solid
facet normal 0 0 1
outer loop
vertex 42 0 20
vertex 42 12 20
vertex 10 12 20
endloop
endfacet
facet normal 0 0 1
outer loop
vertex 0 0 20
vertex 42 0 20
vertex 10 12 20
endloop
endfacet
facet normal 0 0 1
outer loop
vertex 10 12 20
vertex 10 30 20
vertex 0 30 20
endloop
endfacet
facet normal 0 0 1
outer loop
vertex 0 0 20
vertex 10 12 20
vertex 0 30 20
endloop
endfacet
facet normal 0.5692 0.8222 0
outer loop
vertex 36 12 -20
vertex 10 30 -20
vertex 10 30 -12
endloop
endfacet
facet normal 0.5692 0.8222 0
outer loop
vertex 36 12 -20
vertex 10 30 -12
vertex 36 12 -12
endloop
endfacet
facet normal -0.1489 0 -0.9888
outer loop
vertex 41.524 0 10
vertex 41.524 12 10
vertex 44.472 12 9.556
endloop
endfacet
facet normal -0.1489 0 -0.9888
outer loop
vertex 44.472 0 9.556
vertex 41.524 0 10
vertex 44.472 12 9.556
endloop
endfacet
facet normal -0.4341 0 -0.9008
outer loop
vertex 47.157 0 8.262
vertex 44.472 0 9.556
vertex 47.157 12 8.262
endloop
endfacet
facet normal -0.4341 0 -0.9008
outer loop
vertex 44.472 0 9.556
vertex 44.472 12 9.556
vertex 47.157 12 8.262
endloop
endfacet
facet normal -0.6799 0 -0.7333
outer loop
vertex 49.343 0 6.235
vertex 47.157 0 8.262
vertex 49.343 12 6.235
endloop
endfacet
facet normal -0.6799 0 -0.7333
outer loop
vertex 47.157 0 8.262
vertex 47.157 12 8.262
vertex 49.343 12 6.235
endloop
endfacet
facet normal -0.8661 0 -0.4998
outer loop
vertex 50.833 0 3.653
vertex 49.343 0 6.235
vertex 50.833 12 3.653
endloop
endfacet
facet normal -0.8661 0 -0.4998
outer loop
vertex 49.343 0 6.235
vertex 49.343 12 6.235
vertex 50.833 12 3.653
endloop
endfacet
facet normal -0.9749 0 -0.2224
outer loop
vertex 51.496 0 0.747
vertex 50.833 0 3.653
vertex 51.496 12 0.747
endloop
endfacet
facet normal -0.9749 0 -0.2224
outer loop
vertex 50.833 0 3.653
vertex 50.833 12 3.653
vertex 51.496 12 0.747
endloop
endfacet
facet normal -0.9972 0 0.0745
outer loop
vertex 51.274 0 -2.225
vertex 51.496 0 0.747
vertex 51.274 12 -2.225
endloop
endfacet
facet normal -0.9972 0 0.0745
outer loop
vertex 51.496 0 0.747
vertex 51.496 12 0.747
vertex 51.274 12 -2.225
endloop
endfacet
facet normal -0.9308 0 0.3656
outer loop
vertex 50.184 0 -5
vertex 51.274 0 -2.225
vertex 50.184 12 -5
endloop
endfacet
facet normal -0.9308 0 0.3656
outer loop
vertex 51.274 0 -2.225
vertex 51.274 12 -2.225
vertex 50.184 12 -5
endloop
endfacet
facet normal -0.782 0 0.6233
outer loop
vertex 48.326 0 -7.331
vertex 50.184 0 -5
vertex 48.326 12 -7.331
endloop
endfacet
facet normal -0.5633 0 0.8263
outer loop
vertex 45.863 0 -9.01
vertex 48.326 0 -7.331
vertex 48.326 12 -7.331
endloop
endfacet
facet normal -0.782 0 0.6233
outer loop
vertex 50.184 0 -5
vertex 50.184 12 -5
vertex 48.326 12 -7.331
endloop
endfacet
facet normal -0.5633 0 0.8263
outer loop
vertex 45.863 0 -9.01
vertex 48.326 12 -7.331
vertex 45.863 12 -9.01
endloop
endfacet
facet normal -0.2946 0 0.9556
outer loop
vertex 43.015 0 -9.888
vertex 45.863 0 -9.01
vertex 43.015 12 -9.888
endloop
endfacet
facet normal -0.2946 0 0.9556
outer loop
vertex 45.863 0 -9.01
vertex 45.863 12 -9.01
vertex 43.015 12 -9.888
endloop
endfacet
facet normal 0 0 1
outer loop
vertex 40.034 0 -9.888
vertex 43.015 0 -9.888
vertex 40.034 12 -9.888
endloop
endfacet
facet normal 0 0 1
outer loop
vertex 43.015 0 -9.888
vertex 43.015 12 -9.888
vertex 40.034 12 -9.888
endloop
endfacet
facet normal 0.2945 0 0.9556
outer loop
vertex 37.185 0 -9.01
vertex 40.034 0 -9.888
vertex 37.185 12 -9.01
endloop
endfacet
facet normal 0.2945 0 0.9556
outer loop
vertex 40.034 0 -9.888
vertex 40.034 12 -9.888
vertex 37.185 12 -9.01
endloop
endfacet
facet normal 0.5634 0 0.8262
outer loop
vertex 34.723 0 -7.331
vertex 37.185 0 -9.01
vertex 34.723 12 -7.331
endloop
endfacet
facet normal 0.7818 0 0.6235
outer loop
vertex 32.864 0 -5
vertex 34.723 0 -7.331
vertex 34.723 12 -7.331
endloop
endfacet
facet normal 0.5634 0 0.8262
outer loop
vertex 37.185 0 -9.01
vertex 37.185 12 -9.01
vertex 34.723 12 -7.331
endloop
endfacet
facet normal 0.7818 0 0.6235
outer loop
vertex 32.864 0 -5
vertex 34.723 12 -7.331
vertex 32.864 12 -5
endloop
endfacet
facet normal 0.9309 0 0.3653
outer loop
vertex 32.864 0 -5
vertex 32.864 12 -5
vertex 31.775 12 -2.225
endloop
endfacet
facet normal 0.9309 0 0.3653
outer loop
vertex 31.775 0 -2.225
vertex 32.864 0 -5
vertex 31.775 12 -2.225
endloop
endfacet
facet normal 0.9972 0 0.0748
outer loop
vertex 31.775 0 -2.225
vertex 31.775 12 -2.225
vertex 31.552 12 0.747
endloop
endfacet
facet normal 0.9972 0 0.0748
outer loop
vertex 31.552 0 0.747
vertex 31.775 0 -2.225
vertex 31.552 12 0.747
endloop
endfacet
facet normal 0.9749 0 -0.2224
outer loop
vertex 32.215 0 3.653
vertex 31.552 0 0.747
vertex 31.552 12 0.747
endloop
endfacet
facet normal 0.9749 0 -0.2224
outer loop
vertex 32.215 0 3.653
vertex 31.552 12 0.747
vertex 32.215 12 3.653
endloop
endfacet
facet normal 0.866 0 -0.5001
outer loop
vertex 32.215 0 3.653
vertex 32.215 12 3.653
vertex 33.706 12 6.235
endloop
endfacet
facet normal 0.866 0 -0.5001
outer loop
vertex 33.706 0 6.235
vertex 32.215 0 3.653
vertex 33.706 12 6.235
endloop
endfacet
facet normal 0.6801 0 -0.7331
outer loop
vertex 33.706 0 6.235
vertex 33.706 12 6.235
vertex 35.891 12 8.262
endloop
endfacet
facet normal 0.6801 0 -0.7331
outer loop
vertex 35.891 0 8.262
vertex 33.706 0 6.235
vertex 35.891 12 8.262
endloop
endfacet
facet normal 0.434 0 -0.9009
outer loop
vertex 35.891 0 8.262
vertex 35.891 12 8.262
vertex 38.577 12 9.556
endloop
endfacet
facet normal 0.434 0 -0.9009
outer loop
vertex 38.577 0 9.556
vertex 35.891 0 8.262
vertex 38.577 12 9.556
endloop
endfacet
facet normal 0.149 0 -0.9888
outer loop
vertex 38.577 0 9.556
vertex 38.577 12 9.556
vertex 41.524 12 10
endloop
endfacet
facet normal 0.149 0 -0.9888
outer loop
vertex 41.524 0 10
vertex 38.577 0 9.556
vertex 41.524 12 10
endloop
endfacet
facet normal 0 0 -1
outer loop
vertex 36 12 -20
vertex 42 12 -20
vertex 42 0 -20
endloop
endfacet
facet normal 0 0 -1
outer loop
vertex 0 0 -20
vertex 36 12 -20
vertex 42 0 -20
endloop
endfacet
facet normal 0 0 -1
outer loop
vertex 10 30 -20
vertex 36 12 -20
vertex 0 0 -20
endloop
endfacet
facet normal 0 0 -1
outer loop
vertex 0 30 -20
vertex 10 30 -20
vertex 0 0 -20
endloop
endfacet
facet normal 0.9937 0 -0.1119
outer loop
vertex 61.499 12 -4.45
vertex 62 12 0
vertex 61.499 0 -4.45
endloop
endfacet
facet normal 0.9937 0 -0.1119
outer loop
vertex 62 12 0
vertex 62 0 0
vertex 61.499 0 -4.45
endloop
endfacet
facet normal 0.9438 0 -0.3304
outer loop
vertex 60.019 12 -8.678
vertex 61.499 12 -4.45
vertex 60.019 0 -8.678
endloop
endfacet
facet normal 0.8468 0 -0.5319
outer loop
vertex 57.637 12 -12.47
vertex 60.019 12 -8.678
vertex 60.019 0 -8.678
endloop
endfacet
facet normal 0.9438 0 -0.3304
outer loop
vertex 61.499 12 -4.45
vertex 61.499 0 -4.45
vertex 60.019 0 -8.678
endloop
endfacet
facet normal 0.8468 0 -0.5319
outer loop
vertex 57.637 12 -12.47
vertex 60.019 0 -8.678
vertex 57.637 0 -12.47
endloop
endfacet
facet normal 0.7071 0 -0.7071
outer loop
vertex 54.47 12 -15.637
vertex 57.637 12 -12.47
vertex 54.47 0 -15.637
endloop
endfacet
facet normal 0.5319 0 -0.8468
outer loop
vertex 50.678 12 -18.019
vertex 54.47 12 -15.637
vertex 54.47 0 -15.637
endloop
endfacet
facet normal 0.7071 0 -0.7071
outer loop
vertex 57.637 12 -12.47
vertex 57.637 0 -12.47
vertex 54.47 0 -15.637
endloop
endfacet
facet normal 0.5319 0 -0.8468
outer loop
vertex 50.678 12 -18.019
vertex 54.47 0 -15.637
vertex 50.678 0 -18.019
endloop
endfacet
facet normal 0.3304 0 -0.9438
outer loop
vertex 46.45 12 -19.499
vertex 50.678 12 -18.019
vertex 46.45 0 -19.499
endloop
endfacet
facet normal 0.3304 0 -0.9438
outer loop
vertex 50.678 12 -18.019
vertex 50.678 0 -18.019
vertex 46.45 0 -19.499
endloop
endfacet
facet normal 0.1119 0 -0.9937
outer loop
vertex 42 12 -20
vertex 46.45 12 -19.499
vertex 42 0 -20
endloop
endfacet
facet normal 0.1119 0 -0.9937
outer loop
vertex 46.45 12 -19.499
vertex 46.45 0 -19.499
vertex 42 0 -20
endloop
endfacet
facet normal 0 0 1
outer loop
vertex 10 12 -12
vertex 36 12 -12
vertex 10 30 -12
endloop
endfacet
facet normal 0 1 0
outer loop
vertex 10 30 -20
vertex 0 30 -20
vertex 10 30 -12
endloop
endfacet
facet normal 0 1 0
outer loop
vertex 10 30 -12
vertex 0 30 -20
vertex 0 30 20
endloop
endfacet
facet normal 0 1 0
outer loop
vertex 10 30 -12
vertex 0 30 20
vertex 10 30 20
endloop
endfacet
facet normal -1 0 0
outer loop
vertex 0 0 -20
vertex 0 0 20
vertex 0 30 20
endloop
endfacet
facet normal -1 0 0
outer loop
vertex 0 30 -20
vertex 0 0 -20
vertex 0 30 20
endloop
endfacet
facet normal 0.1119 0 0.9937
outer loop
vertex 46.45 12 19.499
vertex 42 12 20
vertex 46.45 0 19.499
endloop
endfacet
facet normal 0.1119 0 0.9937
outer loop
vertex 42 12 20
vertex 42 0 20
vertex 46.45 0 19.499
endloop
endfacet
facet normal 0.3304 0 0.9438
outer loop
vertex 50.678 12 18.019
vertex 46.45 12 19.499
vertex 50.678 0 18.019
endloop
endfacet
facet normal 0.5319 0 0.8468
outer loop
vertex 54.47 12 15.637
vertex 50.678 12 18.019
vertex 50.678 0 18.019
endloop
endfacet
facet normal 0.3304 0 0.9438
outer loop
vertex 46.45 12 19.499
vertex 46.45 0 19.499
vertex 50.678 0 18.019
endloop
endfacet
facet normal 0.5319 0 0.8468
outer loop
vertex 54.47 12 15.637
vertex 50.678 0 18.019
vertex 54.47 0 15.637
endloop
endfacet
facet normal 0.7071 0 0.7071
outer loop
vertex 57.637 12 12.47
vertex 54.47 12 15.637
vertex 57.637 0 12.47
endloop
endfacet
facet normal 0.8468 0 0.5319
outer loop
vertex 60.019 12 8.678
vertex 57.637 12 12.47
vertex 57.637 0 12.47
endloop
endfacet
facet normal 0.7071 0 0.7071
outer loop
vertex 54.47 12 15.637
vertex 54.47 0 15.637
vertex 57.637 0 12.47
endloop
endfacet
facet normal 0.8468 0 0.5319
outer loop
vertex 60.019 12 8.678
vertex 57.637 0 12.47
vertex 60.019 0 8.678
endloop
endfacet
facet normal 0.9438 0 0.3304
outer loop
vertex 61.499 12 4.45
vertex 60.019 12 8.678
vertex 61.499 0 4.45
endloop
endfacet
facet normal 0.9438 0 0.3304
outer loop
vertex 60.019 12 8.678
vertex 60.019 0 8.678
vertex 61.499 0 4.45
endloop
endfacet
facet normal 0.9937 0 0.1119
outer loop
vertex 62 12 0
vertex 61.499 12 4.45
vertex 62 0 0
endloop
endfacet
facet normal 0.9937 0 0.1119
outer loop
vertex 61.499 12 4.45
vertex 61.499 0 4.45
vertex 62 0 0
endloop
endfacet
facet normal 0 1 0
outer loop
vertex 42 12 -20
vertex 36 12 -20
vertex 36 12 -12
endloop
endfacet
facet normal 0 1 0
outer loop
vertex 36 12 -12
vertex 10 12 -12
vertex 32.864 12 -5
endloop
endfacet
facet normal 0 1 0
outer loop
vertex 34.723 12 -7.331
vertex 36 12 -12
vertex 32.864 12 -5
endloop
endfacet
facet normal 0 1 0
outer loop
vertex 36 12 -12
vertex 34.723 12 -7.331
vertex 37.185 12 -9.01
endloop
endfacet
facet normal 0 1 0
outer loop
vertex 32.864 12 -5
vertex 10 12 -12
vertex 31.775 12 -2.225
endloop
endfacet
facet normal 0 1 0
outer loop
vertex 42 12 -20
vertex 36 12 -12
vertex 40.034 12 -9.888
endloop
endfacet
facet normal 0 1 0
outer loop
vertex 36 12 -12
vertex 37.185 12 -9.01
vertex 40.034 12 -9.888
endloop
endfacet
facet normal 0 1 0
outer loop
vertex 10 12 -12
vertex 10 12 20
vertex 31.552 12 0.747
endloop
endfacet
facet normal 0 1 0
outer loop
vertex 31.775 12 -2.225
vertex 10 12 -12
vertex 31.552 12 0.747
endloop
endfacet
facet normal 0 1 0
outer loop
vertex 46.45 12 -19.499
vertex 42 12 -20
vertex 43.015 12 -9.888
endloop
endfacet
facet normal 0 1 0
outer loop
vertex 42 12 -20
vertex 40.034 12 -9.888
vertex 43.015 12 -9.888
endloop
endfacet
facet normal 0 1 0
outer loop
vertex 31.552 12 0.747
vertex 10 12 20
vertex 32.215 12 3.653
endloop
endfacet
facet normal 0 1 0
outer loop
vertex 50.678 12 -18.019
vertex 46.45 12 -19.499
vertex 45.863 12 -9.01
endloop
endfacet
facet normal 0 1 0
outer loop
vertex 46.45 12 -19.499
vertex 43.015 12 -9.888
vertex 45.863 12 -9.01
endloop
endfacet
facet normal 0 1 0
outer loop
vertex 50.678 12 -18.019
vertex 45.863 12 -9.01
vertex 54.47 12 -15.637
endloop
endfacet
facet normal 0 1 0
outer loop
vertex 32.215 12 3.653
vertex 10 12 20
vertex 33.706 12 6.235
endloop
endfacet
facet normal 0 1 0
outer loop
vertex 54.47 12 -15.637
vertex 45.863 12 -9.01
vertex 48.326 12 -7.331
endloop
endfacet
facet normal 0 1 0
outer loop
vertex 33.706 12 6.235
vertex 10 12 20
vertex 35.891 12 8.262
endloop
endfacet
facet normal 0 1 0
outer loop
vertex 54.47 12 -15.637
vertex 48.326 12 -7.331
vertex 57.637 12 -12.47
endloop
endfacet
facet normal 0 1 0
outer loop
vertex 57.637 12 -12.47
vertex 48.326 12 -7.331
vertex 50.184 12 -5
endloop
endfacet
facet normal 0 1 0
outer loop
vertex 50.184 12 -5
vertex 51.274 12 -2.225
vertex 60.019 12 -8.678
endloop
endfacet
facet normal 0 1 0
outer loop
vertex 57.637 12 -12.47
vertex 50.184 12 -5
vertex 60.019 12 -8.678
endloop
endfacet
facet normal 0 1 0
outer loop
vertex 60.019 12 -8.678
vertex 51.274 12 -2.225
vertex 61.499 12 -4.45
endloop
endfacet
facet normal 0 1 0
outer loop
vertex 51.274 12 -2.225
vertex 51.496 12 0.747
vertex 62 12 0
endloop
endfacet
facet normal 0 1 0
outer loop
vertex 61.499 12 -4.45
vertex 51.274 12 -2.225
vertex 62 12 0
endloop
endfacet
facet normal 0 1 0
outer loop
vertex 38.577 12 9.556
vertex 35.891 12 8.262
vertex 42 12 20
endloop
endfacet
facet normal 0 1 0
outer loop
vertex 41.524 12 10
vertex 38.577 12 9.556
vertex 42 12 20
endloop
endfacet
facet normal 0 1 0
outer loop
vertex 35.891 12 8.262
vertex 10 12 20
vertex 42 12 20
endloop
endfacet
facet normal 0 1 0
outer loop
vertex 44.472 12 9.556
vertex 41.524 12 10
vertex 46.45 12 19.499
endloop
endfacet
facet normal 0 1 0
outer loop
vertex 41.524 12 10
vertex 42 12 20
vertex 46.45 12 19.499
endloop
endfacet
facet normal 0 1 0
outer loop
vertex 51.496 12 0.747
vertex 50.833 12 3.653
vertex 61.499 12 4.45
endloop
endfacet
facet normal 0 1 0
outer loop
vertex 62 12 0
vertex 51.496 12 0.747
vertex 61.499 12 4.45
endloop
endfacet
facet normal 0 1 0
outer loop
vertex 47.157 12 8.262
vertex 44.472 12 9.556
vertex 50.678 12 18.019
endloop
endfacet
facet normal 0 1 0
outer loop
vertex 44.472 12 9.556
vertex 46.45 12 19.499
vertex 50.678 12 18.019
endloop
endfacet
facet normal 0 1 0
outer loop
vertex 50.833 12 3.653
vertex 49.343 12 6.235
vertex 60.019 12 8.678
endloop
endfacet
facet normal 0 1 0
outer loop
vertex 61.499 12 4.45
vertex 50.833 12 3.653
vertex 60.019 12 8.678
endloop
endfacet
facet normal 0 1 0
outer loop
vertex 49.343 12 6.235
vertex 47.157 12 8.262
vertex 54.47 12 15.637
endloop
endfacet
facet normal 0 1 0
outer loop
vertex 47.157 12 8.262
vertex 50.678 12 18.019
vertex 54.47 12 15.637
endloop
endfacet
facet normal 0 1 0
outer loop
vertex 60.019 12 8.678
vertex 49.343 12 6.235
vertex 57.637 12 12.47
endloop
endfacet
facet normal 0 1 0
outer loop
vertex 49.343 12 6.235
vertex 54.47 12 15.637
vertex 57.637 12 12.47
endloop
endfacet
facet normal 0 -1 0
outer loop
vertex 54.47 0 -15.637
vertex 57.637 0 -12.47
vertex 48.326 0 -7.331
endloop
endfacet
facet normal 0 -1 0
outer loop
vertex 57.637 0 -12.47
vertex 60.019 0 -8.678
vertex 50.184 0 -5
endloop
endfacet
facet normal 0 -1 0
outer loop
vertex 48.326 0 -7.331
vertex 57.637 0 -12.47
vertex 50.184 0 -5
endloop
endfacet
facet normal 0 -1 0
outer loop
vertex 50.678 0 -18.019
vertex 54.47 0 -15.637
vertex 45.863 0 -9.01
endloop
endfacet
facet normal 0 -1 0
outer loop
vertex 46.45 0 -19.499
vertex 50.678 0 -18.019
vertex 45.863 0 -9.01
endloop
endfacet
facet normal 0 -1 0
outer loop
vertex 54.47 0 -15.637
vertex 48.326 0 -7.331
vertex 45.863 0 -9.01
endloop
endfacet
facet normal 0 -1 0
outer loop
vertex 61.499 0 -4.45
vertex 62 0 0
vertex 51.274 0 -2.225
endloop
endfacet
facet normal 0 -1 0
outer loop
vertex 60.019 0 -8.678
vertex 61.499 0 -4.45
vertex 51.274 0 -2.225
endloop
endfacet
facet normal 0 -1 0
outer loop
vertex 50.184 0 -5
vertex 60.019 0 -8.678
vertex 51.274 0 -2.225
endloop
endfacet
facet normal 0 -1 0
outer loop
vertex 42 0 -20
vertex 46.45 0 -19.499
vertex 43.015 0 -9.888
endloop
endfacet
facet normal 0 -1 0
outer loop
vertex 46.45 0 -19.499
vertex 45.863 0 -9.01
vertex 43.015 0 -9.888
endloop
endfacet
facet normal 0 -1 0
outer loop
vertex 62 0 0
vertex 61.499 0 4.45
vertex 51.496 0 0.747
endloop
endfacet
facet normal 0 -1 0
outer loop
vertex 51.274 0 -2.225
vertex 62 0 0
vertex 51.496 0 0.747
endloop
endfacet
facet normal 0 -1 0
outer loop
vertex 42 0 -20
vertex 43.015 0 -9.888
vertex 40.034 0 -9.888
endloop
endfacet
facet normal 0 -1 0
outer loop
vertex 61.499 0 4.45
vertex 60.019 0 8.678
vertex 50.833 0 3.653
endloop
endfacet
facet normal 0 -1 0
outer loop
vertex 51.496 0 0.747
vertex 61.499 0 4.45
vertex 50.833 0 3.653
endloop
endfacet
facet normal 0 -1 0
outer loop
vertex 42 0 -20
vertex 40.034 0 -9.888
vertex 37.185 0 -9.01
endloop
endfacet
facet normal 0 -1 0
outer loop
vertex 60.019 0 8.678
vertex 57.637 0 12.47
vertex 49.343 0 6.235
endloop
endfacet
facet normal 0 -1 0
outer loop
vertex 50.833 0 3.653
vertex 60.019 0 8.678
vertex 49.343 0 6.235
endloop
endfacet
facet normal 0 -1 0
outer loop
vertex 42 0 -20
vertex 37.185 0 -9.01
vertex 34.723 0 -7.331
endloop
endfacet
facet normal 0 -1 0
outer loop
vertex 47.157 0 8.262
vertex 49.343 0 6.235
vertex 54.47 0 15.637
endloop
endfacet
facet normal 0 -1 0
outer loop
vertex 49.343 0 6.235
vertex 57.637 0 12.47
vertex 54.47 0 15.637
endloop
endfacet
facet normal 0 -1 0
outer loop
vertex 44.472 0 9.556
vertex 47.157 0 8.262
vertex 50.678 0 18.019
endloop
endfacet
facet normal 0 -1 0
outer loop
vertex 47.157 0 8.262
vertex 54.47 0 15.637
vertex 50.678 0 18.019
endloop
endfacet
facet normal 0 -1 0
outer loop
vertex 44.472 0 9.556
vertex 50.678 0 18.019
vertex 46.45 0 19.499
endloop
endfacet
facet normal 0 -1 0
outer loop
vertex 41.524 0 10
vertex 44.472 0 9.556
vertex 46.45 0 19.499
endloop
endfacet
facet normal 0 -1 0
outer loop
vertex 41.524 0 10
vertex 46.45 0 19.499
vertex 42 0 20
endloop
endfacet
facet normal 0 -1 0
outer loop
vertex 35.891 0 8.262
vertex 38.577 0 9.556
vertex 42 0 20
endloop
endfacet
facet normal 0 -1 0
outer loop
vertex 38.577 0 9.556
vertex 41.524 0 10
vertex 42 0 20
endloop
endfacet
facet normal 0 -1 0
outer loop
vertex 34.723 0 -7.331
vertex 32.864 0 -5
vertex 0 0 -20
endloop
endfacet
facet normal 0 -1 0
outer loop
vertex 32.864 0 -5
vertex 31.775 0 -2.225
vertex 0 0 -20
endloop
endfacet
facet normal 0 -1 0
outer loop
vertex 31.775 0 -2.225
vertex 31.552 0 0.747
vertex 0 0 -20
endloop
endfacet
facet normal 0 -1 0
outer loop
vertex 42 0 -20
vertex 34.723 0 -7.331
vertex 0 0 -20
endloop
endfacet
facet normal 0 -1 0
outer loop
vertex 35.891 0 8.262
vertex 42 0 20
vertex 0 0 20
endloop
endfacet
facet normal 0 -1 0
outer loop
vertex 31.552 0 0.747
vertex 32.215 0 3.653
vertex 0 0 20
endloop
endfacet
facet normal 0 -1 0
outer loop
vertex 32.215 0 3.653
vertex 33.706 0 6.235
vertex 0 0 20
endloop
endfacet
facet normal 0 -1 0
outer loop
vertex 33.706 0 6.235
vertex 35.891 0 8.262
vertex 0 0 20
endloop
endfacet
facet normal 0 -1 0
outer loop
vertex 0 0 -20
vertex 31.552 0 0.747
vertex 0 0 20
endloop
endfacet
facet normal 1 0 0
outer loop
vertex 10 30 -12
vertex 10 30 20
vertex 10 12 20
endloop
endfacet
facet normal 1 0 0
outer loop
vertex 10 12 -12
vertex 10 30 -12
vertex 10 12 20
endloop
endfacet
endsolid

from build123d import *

# Parameters (mm, degrees)
EXTRUDE_1_DEPTH     = 20
FILLET_1_R          = 20
SKETCH_2_R          = 10
CUT_EXTRUDE_1_DEPTH = 68.586980995
EXTRUDE_2_DEPTH     = 8


with BuildPart() as part:
    # 草圖1 → 填料-伸長1 (new, symmetric)
    with BuildSketch(Plane.XY):
        Polygon((0, 0), (0, 30), (10, 30), (10, 12), (62, 12), (62, 0), align=None)
    extrude(amount=EXTRUDE_1_DEPTH, both=True)

    # 圓角1
    fillet_1_edges = [part.edges().sort_by_distance(p)[0] for p in [
        (62, 6, -20),
        (62, 6, 20),
    ]]
    fillet(fillet_1_edges, radius=FILLET_1_R - 0.0001)  # a hair under: the kernel refuses the full size

    # 草圖2 → 除料-伸長1 (cut, through all)
    with BuildSketch(Plane(origin=(0, 12, 0), x_dir=(1, 0, 0), z_dir=(0, 1, 0))):
        with Locations(Location((41.524228064, 0, 0), (0, 0, 270))):
            Circle(SKETCH_2_R)
    extrude(amount=-CUT_EXTRUDE_1_DEPTH, mode=Mode.SUBTRACT)

    # 草圖4 → 填料-伸長2 (add)
    with BuildSketch(Plane(origin=(0, 0, -20), x_dir=(-1, 0, 0), z_dir=(0, 0, -1))):
        Polygon((-10, 30), (-36, 12), (-10, 12), align=None)
    extrude(amount=-EXTRUDE_2_DEPTH)


solid = part.part
